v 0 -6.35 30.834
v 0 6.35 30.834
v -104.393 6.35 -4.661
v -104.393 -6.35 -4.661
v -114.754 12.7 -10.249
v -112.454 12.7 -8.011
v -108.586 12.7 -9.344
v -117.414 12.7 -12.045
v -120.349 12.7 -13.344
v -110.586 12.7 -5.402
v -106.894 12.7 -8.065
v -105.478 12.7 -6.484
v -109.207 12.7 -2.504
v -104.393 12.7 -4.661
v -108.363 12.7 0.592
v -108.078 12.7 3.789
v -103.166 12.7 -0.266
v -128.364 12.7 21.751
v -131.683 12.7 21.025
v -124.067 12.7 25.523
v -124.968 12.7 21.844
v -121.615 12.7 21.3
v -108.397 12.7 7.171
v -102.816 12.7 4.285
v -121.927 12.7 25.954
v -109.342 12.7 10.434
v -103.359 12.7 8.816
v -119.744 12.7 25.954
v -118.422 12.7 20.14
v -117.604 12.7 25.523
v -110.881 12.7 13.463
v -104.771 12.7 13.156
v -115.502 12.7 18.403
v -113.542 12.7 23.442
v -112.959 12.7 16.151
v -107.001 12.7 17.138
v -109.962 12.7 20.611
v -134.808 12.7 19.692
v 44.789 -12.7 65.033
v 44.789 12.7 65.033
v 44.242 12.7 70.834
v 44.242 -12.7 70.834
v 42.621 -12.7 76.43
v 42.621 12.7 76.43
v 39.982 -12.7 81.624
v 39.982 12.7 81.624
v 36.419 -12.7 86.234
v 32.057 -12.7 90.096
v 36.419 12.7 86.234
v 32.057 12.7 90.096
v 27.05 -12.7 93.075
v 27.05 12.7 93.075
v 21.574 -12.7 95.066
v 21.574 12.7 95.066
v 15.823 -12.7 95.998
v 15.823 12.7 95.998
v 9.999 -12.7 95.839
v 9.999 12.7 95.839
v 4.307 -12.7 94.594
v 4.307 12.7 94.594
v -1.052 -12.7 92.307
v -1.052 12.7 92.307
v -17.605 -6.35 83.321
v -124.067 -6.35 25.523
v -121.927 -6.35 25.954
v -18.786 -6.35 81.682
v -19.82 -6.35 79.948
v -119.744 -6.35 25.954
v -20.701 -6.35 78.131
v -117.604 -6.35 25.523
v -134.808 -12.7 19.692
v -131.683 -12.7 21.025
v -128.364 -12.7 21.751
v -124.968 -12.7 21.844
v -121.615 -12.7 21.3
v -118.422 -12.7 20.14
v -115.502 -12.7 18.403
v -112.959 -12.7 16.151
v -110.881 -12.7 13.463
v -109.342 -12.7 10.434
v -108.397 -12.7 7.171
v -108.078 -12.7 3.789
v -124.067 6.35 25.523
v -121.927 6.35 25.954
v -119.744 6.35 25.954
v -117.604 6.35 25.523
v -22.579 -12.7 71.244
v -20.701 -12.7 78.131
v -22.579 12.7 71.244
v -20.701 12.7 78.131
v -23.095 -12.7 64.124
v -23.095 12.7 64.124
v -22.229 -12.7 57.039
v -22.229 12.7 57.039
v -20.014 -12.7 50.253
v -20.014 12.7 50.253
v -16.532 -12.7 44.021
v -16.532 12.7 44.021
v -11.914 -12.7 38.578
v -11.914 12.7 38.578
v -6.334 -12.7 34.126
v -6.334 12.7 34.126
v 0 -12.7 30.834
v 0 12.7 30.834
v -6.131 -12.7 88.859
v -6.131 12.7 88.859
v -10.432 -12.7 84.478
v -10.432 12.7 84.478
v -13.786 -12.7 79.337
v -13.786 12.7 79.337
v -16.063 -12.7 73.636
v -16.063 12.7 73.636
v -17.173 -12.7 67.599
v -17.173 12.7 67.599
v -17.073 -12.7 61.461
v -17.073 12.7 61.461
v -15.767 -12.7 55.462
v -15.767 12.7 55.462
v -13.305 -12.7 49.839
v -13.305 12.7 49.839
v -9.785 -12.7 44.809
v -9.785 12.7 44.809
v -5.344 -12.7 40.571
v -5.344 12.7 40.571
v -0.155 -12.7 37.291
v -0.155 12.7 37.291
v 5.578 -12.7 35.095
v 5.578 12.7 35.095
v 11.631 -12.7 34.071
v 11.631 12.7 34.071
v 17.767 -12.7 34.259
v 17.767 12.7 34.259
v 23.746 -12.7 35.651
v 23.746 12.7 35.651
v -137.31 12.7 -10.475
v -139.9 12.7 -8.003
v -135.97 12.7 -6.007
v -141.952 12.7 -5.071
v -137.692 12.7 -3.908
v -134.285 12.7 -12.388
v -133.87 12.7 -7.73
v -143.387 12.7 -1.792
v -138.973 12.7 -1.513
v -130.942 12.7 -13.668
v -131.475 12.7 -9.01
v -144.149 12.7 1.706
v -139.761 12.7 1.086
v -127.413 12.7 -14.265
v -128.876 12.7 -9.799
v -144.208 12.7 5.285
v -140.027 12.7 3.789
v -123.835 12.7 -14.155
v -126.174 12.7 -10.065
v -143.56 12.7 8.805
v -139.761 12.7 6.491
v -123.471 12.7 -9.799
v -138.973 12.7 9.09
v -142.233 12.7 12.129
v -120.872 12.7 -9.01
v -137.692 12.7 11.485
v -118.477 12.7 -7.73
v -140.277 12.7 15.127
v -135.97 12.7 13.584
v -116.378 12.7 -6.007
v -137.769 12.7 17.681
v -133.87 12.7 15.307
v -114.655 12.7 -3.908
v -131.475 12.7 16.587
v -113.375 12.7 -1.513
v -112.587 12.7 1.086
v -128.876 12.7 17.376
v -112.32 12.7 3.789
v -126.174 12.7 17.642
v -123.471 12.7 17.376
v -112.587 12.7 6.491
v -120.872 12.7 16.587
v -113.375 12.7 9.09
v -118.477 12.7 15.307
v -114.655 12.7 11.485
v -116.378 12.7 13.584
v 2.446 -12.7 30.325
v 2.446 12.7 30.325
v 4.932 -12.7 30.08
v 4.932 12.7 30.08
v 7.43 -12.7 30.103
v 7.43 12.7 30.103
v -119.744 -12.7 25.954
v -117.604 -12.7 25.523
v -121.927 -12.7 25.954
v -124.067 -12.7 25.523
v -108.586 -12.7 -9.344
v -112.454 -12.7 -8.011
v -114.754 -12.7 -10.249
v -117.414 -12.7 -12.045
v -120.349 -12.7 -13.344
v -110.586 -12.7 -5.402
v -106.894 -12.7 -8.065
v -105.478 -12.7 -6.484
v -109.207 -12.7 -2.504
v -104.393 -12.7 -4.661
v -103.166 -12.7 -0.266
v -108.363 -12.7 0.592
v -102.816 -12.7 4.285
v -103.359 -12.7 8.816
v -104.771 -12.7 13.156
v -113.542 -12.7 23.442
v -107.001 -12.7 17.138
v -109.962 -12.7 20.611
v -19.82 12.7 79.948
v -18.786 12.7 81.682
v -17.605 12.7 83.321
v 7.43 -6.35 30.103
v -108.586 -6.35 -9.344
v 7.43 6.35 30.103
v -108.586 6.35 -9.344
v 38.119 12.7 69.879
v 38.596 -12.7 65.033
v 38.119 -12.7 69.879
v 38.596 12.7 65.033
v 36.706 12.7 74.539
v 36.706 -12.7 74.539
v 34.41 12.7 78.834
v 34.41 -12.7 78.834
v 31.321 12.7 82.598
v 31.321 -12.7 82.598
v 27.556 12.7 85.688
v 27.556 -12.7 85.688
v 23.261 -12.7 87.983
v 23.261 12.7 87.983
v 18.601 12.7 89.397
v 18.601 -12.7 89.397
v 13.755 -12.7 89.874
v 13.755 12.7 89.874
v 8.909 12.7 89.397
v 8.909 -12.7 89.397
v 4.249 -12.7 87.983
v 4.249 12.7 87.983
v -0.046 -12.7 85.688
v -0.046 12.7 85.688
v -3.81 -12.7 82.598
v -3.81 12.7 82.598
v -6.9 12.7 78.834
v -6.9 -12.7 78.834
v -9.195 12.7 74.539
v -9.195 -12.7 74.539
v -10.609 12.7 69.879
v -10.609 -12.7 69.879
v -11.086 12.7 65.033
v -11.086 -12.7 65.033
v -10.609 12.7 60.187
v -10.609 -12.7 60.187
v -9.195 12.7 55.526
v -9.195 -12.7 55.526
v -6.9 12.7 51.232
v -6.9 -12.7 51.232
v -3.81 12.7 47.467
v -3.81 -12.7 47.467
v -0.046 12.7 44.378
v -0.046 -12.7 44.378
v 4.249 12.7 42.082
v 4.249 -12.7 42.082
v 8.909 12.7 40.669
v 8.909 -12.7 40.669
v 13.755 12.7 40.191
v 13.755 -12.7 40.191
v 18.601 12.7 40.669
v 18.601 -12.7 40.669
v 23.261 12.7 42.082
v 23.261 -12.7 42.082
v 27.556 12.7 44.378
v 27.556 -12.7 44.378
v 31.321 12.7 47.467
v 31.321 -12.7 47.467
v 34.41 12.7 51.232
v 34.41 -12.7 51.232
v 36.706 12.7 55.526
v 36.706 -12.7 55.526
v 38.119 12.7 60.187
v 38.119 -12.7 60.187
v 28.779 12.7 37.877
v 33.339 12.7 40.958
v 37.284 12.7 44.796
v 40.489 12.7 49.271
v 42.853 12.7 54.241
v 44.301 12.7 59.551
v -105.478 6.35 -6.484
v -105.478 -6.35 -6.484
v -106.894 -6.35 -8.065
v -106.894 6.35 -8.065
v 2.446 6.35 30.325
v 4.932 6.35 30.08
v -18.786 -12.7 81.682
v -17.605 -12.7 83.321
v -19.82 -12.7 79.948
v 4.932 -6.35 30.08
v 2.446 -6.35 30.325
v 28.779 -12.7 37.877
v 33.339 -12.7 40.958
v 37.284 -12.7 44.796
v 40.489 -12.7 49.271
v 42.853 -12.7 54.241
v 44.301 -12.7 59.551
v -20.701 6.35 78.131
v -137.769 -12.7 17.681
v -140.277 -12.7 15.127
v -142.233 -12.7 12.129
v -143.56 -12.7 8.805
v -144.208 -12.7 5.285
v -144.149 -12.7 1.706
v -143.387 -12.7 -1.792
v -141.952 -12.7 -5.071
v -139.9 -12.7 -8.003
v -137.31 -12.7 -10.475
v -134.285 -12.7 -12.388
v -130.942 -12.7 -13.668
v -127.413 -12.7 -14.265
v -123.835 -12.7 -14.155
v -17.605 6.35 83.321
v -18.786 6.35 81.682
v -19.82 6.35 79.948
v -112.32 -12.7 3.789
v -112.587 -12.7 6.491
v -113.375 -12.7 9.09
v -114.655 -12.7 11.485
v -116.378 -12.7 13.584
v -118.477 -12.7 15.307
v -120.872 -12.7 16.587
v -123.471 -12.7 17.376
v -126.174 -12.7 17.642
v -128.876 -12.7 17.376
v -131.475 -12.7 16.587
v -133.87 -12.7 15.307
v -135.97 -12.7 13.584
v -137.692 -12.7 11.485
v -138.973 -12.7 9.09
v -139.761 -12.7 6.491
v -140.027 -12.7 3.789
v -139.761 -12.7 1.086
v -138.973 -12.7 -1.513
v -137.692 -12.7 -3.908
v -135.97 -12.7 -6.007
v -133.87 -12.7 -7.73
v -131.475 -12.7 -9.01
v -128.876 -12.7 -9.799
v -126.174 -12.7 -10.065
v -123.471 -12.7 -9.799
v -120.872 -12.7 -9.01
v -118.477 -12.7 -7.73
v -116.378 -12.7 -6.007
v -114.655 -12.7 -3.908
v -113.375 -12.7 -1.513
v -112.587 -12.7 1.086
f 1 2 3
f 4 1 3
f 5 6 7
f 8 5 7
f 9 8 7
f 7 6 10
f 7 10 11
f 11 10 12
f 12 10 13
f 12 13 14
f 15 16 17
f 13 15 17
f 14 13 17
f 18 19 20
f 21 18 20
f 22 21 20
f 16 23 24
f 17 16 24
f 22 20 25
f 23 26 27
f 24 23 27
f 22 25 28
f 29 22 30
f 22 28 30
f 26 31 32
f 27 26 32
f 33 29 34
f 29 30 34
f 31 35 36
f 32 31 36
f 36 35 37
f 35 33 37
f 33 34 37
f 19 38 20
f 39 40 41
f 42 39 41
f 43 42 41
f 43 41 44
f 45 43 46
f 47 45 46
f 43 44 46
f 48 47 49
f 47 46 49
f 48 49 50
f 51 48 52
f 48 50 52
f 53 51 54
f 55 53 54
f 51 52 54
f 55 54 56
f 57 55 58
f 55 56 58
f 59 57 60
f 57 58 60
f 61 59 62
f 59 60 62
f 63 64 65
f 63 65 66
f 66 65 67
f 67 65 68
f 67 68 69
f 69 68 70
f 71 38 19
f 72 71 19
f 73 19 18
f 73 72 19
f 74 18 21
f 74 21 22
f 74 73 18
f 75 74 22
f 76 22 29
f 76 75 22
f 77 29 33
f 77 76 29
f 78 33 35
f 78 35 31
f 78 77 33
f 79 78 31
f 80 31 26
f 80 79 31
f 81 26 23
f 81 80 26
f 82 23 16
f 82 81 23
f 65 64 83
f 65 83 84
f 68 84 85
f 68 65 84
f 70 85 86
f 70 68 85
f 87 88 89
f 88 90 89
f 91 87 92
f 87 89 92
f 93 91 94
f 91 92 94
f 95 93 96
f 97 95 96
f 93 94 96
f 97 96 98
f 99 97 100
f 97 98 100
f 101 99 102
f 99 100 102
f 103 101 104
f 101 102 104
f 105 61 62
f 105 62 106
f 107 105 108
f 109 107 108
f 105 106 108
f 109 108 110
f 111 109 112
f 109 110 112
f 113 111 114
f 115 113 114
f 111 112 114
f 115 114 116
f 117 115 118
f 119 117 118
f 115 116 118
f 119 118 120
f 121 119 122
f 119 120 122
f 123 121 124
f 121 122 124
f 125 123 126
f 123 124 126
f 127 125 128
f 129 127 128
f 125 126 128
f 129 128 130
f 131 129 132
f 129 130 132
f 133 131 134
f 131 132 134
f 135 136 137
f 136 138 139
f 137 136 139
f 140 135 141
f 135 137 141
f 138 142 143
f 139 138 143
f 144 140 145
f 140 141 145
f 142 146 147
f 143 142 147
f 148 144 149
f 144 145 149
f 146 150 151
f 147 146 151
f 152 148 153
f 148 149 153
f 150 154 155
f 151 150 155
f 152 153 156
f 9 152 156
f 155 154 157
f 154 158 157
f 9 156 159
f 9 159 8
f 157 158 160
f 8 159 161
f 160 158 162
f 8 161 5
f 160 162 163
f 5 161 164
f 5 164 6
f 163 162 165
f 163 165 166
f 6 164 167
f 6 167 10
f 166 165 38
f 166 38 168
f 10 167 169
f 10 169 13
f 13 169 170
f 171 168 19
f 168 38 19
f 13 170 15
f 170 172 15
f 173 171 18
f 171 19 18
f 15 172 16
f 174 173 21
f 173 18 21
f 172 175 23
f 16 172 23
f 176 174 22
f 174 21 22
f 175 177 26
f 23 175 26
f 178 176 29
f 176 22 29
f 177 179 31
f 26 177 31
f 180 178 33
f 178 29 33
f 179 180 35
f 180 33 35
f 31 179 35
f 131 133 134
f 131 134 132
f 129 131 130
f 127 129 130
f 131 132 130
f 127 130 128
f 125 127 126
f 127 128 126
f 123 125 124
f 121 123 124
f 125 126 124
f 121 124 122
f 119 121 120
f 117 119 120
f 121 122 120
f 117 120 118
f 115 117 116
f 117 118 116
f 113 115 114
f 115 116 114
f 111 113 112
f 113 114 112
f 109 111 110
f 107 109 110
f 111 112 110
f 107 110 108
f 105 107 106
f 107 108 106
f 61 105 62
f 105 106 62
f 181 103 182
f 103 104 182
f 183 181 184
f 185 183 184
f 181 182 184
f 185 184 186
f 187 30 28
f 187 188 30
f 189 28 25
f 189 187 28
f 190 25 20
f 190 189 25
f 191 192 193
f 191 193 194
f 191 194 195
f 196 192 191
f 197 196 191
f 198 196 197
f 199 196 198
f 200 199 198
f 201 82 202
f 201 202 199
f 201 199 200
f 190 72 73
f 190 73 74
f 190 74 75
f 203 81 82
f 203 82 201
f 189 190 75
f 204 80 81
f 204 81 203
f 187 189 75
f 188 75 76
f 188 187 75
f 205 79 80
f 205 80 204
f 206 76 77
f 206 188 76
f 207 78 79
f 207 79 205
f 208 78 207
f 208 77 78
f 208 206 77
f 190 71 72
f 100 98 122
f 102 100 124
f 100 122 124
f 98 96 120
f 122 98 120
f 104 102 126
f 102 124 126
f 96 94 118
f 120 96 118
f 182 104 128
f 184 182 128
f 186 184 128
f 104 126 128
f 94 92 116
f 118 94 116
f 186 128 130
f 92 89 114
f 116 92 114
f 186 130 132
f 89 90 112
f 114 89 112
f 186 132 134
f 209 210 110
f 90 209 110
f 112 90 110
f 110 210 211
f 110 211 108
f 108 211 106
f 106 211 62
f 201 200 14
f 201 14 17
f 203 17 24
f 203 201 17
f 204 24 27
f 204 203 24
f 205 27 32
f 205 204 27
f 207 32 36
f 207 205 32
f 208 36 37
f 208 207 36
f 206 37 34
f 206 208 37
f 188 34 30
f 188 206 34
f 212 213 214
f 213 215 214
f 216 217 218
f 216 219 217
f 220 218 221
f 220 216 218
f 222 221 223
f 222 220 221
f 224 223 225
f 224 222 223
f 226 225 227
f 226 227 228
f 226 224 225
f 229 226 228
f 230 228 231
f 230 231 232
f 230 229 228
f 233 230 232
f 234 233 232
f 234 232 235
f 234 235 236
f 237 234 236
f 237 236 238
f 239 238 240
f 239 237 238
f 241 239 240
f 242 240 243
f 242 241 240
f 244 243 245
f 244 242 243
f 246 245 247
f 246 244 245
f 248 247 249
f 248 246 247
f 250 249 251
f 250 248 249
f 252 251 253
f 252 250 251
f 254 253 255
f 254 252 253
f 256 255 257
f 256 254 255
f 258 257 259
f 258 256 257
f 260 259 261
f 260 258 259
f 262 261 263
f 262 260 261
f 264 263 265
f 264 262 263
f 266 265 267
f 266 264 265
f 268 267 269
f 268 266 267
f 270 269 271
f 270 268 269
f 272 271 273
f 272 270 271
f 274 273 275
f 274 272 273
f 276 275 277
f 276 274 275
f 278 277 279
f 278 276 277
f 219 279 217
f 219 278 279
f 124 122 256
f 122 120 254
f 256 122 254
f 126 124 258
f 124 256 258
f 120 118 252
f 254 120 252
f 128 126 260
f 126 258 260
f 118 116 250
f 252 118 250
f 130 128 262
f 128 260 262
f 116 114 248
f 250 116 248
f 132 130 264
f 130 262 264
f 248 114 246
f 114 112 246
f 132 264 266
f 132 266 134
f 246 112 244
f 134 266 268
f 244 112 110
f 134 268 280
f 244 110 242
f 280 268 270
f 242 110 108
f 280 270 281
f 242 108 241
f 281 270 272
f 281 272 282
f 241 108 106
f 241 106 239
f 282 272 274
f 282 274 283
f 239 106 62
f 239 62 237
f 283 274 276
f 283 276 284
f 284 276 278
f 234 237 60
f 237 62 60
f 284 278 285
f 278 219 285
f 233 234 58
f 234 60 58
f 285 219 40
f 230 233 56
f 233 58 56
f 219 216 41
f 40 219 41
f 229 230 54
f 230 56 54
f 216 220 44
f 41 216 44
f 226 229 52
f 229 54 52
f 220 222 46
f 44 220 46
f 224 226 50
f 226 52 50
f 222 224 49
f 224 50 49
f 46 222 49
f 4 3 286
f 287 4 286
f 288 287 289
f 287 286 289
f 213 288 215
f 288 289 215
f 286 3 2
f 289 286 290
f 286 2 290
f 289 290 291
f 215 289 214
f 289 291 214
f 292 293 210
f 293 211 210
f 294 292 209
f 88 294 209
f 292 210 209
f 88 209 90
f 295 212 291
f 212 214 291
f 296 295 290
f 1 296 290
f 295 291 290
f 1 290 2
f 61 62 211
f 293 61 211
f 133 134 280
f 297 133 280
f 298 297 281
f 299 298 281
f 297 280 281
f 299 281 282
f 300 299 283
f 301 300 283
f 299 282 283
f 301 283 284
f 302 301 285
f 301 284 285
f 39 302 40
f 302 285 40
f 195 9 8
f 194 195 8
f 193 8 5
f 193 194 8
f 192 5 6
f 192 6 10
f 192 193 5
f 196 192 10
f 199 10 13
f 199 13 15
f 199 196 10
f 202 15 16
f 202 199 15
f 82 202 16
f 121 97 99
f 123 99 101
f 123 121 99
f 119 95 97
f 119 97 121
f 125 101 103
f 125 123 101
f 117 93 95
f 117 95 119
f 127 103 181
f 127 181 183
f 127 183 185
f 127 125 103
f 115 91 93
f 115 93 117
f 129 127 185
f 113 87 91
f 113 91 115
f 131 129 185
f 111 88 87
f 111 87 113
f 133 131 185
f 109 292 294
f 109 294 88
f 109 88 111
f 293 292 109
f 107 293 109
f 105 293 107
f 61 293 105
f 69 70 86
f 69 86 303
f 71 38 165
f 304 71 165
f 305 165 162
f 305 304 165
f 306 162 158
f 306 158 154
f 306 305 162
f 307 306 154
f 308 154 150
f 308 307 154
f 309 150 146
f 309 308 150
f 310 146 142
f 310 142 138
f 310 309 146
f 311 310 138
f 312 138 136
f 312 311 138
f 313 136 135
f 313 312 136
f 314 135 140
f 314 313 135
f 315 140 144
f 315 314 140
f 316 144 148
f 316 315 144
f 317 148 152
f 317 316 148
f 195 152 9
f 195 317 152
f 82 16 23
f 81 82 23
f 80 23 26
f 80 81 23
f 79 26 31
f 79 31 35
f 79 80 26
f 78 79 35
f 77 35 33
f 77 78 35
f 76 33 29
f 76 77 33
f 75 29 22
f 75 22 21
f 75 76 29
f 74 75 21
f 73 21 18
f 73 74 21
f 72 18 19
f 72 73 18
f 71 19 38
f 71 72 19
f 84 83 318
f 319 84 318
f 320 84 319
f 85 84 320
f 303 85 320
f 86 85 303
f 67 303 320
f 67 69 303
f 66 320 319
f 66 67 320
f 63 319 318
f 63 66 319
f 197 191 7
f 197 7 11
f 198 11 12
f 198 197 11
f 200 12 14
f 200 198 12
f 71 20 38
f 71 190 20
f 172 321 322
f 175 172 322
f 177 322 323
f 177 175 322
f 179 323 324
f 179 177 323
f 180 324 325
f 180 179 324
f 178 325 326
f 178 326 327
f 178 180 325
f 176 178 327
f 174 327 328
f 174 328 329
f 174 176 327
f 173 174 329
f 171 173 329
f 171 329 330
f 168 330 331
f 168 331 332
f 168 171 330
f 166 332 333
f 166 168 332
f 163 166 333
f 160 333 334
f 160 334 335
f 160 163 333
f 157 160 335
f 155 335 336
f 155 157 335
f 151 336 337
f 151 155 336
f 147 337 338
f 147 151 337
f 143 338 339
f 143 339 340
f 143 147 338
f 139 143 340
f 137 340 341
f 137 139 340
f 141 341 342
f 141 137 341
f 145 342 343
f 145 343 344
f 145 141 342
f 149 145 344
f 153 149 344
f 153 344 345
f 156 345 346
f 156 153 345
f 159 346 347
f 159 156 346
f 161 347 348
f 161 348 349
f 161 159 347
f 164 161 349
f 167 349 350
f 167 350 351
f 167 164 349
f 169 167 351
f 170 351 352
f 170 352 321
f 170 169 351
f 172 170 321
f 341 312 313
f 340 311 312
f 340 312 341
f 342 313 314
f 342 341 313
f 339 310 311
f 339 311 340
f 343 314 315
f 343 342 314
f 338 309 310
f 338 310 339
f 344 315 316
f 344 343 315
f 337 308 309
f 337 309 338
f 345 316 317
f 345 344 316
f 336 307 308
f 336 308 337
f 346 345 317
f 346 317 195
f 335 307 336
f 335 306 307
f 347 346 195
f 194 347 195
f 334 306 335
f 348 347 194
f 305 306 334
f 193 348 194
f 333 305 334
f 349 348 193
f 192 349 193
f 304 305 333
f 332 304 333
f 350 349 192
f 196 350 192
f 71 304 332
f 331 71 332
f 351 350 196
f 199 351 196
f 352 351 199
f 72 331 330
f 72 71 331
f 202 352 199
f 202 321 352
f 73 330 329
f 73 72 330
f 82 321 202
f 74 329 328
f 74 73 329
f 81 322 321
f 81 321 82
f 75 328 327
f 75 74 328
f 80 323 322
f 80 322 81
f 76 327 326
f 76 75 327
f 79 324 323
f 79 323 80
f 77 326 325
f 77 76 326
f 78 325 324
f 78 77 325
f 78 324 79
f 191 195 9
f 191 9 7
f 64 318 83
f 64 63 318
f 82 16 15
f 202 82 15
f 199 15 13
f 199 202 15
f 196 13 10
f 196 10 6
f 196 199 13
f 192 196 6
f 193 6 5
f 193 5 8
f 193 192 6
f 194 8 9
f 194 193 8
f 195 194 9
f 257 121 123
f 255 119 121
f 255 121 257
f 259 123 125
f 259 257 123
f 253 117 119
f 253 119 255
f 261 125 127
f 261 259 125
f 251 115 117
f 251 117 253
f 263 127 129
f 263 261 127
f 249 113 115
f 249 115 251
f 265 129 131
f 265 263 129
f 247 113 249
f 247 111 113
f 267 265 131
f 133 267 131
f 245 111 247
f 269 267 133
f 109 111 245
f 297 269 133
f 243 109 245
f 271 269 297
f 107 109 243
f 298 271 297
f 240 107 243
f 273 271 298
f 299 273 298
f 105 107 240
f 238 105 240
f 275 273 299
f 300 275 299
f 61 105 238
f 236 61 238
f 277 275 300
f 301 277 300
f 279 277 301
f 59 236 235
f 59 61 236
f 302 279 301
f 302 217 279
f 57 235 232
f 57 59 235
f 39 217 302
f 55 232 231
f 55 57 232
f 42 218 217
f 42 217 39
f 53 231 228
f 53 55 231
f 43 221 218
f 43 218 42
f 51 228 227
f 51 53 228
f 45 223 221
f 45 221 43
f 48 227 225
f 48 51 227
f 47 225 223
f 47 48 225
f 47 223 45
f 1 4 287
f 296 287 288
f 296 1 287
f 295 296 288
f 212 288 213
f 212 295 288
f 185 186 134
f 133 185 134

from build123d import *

# Parameters (mm, degrees)
F2_R     = 24.841403
F2_R_2   = 13.853338
F3_DEPTH = 12.7
F4_DEPTH = 12.7
F5_DEPTH = 6.35


with BuildPart() as f3:
    # F2 (on Front) → F3 (new body, symmetric)
    with BuildSketch(Plane.XZ):
        with BuildLine():
            ThreePointArc((44.789403, 65.03289), (29.623329, 91.703627), (-1.051969, 92.307081))
            ThreePointArc((-1.051969, 92.307081), (-14.675364, 52.589408), (23.745549, 35.65058))
            ThreePointArc((23.745549, 35.65058), (38.985782, 46.962445), (44.789403, 65.03289))
        make_face()
        with Locations((13.75507, 65.03289)):
            Circle(F2_R, mode=Mode.SUBTRACT)
        with BuildLine():
            ThreePointArc((-120.348502, -13.343815), (-111.462148, -6.748034), (-108.078142, 3.788575))
            ThreePointArc((-108.078142, 3.788575), (-116.921256, 19.339886), (-134.807567, 19.691751))
            ThreePointArc((-134.807567, 19.691751), (-142.751167, -3.467036), (-120.348502, -13.343815))
        make_face()
        with Locations((-126.173802, 3.788575)):
            Circle(F2_R_2, mode=Mode.SUBTRACT)
    extrude(amount=F3_DEPTH, both=True)


with BuildPart() as f4:
    # F2 (on Front) → F4 (new body, symmetric)
    with BuildSketch(Plane.XZ):
        with BuildLine():
            Line((-1.051969, 92.307081), (-17.604658, 83.320698))
            ThreePointArc((-17.604658, 83.320698), (-19.321753, 80.826497), (-20.700884, 78.130675))
            ThreePointArc((-20.700884, 78.130675), (-20.013541, 50.252985), (0, 30.83402))
            ThreePointArc((0, 30.83402), (3.685515, 30.16899), (7.429967, 30.103008))
            Line((7.429967, 30.103008), (23.745549, 35.65058))
            ThreePointArc((23.745549, 35.65058), (-14.675364, 52.589408), (-1.051969, 92.307081))
        make_face()
        with BuildLine():
            ThreePointArc((-134.807567, 19.691751), (-116.921256, 19.339886), (-108.078142, 3.788575))
            ThreePointArc((-108.078142, 3.788575), (-111.462148, -6.748034), (-120.348502, -13.343815))
            Line((-120.348502, -13.343815), (-108.586277, -9.344462))
            ThreePointArc((-108.586277, -9.344462), (-106.147826, -7.308885), (-104.392854, -4.661303))
            ThreePointArc((-104.392854, -4.661303), (-104.771432, 13.156002), (-117.603765, 25.522525))
            ThreePointArc((-117.603765, 25.522525), (-120.835597, 26.00811), (-124.067429, 25.522525))
            Line((-124.067429, 25.522525), (-134.807567, 19.691751))
        make_face()
    extrude(amount=F4_DEPTH, both=True)


with BuildPart() as f5:
    # F2 (on Front) → F5 (new body, symmetric)
    with BuildSketch(Plane.XZ):
        with BuildLine():
            ThreePointArc((-104.392854, -4.661303), (-106.147826, -7.308885), (-108.586277, -9.344462))
            Line((-108.586277, -9.344462), (7.429967, 30.103008))
            ThreePointArc((7.429967, 30.103008), (3.685515, 30.16899), (0, 30.83402))
            Line((0, 30.83402), (-104.392854, -4.661303))
        make_face()
        with BuildLine():
            Line((-17.604658, 83.320698), (-124.067429, 25.522525))
            ThreePointArc((-124.067429, 25.522525), (-120.835597, 26.00811), (-117.603765, 25.522525))
            Line((-117.603765, 25.522525), (-20.700884, 78.130675))
            ThreePointArc((-20.700884, 78.130675), (-19.321753, 80.826497), (-17.604658, 83.320698))
        make_face()
    extrude(amount=F5_DEPTH, both=True)


solid = Compound([f3.part, f4.part, f5.part])
